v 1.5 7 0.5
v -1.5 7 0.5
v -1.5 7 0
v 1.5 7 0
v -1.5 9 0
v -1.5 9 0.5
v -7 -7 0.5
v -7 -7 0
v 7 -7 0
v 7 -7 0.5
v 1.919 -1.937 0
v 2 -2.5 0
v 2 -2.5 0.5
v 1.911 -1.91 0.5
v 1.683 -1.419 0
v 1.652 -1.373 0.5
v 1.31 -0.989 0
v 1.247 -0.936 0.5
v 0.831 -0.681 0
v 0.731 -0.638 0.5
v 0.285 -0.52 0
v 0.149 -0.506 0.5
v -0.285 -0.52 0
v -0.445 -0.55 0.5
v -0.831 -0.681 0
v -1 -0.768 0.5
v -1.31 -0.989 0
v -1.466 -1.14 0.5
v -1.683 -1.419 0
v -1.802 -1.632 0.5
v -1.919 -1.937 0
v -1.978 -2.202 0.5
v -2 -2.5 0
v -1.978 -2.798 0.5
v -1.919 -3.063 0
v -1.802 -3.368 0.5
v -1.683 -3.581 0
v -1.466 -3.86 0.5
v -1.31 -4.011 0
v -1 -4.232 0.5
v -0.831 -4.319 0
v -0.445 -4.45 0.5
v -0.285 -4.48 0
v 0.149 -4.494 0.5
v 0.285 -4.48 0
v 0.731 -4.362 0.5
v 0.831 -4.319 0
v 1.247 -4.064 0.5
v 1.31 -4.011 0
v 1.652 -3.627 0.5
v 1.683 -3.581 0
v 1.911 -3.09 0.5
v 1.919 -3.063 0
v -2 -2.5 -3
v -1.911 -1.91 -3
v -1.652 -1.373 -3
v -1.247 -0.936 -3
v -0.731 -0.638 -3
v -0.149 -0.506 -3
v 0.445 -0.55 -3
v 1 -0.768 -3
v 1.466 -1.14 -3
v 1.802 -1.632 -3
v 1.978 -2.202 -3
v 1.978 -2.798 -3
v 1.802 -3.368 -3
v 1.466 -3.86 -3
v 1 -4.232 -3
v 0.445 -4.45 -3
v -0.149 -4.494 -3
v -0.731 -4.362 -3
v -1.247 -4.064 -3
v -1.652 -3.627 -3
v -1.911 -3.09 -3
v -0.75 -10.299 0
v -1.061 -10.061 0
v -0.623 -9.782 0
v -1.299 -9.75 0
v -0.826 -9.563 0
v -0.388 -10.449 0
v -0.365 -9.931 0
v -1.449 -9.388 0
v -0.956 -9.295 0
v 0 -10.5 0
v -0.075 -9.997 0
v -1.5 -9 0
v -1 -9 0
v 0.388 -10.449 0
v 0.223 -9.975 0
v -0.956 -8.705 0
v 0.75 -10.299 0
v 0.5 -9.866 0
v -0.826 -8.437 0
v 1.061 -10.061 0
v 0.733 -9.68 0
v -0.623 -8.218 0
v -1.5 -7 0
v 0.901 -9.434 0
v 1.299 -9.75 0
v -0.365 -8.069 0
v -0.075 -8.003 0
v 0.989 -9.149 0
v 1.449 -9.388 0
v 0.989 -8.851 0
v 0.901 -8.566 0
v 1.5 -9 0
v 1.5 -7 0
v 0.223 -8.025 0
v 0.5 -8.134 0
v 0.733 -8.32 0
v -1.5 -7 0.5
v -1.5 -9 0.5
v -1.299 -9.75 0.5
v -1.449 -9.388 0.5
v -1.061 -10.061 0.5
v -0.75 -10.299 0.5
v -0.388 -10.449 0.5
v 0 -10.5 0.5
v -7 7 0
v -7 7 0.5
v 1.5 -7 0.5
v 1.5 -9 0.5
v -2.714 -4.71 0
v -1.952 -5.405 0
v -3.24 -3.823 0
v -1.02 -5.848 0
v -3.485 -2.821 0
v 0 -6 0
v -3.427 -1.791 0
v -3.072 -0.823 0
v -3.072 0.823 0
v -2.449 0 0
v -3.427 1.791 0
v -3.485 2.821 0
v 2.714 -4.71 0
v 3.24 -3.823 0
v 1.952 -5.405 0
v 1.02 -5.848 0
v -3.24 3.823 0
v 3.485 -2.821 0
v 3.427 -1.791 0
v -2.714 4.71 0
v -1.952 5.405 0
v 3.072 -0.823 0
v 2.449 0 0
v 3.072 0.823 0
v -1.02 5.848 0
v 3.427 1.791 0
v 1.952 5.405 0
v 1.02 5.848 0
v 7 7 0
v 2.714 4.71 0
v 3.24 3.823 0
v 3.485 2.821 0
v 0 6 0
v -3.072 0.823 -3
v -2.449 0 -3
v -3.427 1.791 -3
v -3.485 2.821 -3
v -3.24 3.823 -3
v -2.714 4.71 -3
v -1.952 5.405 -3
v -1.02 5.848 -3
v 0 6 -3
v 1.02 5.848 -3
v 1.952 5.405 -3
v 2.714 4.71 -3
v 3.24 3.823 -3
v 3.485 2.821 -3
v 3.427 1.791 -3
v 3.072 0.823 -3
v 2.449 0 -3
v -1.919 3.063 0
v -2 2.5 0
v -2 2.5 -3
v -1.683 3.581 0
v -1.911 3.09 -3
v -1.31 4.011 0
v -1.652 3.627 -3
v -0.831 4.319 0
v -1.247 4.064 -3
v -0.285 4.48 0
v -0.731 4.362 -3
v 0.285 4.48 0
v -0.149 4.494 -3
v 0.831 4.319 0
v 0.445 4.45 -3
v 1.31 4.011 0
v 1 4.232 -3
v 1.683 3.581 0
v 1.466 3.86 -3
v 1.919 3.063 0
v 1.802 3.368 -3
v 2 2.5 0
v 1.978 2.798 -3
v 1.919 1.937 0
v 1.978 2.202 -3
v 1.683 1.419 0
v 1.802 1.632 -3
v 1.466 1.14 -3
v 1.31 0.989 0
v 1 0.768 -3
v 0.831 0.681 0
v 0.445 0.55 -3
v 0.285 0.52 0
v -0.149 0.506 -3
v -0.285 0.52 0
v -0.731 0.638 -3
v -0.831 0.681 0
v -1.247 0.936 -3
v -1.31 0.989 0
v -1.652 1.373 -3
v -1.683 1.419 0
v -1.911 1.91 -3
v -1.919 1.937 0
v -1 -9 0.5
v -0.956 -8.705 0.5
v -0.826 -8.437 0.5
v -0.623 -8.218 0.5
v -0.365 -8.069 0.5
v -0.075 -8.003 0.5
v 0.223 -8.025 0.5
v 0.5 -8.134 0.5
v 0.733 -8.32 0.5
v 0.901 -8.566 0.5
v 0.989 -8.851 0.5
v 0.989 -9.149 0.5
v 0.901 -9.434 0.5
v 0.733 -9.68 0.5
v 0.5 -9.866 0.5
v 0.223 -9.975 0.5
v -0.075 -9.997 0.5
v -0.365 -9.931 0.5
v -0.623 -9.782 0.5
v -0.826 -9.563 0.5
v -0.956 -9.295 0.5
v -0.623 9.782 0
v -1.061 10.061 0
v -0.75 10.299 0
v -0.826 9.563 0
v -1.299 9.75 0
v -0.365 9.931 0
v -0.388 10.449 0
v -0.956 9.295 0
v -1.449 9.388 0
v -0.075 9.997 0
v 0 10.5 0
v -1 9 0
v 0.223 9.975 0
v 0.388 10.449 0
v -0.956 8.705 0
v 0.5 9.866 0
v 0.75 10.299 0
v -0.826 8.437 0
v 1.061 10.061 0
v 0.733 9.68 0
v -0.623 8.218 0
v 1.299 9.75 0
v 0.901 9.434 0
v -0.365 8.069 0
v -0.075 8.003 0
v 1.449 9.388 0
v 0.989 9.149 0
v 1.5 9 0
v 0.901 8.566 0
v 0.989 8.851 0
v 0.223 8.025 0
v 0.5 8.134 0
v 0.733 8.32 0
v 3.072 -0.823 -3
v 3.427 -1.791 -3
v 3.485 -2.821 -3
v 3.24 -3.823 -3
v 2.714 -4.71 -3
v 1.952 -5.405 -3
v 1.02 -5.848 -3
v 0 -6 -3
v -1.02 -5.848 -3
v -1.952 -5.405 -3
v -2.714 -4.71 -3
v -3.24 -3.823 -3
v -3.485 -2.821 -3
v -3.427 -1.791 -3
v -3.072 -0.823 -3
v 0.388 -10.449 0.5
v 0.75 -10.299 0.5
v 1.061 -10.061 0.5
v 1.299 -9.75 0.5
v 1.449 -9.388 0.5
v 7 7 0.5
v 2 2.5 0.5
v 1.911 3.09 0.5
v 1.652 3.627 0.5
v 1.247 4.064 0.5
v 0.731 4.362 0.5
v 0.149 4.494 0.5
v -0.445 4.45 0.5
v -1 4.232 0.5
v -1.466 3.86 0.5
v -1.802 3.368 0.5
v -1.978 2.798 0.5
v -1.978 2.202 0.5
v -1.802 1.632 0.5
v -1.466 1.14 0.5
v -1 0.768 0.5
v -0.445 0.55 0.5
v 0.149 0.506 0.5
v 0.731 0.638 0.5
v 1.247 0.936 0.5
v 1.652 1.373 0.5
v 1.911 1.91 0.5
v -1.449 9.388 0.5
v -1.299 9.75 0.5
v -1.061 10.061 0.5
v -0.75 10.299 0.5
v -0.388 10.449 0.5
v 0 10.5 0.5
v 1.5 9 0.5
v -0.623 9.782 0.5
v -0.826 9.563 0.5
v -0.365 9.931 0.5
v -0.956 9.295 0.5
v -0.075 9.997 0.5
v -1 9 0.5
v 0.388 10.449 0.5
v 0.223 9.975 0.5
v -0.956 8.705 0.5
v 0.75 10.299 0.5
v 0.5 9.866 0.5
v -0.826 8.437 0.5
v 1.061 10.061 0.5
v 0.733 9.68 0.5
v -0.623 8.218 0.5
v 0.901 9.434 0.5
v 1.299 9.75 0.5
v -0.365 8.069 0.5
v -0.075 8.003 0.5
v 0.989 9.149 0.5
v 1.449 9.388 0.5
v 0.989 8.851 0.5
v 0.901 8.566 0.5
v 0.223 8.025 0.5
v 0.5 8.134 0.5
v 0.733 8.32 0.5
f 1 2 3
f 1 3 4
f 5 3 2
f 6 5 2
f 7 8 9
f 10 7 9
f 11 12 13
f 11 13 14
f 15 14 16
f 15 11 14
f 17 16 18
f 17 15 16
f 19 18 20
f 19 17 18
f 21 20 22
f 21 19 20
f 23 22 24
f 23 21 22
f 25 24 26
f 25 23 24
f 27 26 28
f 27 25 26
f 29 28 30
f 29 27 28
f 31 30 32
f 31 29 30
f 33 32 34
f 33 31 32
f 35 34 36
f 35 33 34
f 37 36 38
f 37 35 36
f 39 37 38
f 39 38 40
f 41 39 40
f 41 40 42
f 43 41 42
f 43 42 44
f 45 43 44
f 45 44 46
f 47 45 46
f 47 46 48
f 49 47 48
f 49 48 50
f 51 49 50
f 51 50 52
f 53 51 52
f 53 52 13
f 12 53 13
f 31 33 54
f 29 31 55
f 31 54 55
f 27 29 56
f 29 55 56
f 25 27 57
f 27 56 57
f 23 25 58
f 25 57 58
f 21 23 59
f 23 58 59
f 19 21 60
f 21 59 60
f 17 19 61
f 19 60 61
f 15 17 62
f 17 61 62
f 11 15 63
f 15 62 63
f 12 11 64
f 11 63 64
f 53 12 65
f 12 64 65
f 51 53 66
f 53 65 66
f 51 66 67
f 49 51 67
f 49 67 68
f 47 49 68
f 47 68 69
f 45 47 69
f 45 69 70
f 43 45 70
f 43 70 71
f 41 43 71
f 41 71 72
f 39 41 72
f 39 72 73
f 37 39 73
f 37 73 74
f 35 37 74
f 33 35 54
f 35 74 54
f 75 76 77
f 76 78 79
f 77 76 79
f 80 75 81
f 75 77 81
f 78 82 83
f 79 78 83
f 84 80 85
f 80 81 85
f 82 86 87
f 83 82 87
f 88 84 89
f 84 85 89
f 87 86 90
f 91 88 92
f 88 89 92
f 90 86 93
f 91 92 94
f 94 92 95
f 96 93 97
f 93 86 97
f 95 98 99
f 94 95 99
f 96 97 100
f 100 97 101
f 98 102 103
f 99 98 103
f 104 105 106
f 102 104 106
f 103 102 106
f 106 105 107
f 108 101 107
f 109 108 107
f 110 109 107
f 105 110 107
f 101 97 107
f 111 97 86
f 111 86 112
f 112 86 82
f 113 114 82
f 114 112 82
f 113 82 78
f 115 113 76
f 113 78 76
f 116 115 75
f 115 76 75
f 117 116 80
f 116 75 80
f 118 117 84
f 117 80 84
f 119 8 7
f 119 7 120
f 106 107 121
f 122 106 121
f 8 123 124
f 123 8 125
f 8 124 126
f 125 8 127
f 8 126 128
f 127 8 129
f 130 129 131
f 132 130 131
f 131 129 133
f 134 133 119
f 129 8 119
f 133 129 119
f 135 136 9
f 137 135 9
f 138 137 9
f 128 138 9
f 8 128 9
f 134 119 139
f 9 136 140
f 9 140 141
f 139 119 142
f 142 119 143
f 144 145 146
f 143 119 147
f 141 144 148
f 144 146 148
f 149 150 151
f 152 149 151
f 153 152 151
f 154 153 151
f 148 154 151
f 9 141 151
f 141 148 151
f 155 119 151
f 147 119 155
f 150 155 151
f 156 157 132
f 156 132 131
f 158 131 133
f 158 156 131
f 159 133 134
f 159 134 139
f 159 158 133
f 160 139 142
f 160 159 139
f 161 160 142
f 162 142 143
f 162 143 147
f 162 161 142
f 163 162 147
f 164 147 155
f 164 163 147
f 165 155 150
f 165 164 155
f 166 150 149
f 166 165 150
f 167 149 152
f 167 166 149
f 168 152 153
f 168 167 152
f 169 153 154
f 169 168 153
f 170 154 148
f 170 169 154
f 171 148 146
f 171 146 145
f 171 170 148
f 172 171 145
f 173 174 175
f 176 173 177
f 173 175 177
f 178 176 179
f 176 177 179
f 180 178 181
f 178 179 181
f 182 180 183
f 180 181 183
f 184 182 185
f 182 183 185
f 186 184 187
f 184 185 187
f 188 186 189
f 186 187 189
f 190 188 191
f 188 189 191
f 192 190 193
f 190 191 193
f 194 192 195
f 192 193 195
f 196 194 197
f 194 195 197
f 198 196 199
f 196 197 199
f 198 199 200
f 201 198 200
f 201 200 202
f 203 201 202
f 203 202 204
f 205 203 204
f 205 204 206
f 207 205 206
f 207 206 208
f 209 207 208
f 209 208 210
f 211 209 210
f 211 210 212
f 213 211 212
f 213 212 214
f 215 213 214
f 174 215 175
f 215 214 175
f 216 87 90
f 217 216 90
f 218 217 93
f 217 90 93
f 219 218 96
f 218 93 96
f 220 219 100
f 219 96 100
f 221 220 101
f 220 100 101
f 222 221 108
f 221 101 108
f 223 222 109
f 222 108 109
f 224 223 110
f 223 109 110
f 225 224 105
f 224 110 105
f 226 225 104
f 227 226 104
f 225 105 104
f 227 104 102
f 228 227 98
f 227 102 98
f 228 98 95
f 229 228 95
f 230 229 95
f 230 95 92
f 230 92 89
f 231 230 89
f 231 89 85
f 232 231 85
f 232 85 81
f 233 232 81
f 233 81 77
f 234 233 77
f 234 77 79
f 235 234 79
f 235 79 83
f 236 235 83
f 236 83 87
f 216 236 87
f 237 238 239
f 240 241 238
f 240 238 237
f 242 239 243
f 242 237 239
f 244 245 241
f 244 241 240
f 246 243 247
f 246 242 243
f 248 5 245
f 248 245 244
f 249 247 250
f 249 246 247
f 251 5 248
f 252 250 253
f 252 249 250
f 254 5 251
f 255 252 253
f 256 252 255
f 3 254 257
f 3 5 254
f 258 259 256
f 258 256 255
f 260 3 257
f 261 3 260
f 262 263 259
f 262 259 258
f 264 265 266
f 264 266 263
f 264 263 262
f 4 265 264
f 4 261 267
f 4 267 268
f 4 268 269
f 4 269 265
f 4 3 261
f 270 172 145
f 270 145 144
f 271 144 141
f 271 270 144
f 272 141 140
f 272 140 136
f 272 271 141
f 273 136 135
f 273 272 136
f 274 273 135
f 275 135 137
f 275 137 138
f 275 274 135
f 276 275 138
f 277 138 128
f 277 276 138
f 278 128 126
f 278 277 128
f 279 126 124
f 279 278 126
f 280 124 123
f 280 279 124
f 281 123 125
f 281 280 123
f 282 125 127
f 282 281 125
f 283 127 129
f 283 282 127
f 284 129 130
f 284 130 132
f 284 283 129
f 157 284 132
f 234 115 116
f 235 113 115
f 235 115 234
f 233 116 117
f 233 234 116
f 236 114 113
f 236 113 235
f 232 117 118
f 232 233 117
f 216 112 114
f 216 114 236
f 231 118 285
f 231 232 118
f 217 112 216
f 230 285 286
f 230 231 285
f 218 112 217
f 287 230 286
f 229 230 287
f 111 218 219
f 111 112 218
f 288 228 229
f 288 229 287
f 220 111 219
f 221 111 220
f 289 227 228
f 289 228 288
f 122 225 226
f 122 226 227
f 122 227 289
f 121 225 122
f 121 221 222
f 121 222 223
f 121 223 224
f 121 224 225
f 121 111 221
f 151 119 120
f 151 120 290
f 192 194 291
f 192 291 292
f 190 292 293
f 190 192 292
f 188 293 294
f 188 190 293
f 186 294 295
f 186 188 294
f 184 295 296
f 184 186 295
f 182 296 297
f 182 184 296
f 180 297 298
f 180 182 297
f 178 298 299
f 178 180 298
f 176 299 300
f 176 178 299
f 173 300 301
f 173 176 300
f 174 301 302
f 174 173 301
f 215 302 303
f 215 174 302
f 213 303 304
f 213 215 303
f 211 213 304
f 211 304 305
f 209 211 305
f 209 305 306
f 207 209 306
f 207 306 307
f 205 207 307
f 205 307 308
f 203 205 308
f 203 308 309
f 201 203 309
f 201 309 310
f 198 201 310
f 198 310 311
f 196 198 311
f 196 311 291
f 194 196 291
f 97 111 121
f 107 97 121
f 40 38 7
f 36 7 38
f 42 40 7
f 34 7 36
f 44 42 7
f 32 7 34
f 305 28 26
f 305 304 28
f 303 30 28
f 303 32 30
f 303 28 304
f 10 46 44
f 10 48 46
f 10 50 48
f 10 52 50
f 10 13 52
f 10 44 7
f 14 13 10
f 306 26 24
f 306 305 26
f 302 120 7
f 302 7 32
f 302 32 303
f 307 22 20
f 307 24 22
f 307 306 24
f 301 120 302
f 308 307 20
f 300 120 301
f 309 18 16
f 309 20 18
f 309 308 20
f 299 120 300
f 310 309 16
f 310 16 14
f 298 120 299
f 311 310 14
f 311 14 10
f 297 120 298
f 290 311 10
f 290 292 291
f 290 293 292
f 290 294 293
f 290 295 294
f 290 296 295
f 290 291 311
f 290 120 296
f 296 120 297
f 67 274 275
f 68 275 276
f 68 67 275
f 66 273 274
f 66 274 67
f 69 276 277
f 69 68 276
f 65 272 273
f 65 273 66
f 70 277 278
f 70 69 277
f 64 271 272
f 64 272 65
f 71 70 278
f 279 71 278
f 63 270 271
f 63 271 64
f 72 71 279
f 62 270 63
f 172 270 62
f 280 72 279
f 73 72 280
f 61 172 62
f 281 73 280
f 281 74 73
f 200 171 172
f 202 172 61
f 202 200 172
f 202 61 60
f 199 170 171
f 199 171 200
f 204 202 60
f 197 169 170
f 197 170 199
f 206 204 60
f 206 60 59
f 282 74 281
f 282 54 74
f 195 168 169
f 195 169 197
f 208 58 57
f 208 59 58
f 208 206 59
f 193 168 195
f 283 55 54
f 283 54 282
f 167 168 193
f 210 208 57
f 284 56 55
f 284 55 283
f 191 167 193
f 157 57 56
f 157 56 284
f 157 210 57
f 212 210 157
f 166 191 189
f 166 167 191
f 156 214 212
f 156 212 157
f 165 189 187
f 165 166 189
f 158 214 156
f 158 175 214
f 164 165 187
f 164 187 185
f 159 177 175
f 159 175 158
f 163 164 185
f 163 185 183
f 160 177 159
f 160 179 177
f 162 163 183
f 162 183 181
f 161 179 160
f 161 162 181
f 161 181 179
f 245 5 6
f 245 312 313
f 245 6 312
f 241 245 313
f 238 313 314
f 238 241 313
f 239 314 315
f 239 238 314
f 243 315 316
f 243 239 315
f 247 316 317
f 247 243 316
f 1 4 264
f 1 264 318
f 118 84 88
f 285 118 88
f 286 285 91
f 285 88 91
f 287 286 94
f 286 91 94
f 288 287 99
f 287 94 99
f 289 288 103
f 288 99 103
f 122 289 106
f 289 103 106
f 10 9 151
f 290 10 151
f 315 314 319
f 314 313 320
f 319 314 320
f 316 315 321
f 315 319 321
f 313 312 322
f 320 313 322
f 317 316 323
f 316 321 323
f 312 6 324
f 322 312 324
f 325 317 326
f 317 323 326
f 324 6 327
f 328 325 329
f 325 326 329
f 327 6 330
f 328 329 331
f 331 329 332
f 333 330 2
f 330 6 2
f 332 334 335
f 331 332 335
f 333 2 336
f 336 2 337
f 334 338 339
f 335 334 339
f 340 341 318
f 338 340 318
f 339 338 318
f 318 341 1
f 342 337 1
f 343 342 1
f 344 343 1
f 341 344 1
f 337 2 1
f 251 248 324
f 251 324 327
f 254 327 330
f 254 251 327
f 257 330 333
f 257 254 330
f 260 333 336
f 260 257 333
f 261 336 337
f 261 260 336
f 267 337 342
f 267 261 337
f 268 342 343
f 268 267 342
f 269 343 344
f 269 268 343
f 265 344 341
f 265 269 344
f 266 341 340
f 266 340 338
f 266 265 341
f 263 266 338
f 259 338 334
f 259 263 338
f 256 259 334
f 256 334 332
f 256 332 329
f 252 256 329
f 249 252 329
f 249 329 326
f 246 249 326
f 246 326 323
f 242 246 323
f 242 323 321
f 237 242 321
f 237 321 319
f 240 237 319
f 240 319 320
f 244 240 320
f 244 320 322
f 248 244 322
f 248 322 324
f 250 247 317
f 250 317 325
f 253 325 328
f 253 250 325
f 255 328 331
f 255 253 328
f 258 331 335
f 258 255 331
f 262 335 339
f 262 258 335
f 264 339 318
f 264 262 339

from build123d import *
from build123d.topology import SkipClean

# Parameters (mm, degrees)
SKETCH_2_W          = 14
SKETCH_2_H          = 14
SKETCH_2_R          = 2
EXTRUDE_1_DEPTH     = 0.5
SKETCH_3_W          = 3
SKETCH_3_H          = 0.5
EXTRUDE_2_DEPTH     = 3.5
CUT_EXTRUDE_1_DEPTH = 4
SKETCH_5_R          = 1
CUT_EXTRUDE_2_DEPTH = 4
EXTRUDE_START       = 3
SKETCH_8_R          = 2
EXTRUDE_4_DEPTH     = 3


with BuildPart() as part:
    # 草图2 → 凸台-拉伸1 (new body)
    with BuildSketch(Plane.XY):
        Rectangle(SKETCH_2_W, SKETCH_2_H)
        with Locations((0, -2.5)):
            Circle(SKETCH_2_R, mode=Mode.SUBTRACT)
        with Locations((0, 2.5)):
            Circle(SKETCH_2_R, mode=Mode.SUBTRACT)
    extrude(amount=EXTRUDE_1_DEPTH)

    # 草图8 → 凸台-拉伸4 (add)
    with SkipClean():  # the faces are left unmerged after this step: merging them gives an invalid solid
        with BuildSketch(Plane(origin=(0, 0, 0), x_dir=(-1, 0, 0), z_dir=(0, 0, -1)).offset(EXTRUDE_START)):
            with BuildLine():
                ThreePointArc((2.449489743, 0), (0, 6), (-2.449489743, 0))
                ThreePointArc((-2.449489743, 0), (0, -6), (2.449489743, 0))
            make_face()
            with Locations((0, -2.5)):
                Circle(SKETCH_8_R, mode=Mode.SUBTRACT)
            with Locations((0, 2.5)):
                Circle(SKETCH_8_R, mode=Mode.SUBTRACT)
        extrude(amount=-EXTRUDE_4_DEPTH)


with BuildPart() as body_2:
    # 草图3 → 凸台-拉伸2 (new body)
    with BuildSketch(Plane.XZ.offset(7)):
        with Locations((0, 0.25)):
            Rectangle(SKETCH_3_W, SKETCH_3_H)
    extrude(amount=EXTRUDE_2_DEPTH)

    # 草图4 → 切除-拉伸1 (cut)
    with BuildSketch(Plane(origin=(0, 0, 0), x_dir=(-1, 0, 0), z_dir=(0, 0, -1))):
        with BuildLine():
            Line((1.5, -10.5), (1.5, -9))
            ThreePointArc((1.5, -9), (1.060660172, -10.060660172), (0, -10.5))
            Line((0, -10.5), (1.5, -10.5))
        make_face()
        with BuildLine():
            ThreePointArc((0, -10.5), (-1.060660172, -10.060660172), (-1.5, -9))
            Line((-1.5, -9), (-1.5, -10.5))
            Line((-1.5, -10.5), (0, -10.5))
        make_face()
    extrude(amount=-CUT_EXTRUDE_1_DEPTH, mode=Mode.SUBTRACT)

    # 草图5 → 切除-拉伸2 (cut)
    with BuildSketch(Plane(origin=(0, 0, 0), x_dir=(-1, 0, 0), z_dir=(0, 0, -1))):
        with Locations((0, -9)):
            Circle(SKETCH_5_R)
    extrude(amount=-CUT_EXTRUDE_2_DEPTH, mode=Mode.SUBTRACT)


with BuildPart() as body_3:
    # 镜向7: mirrored copy
    add(body_2.part.mirror(Plane.ZX))


solid = Compound([part.part, body_2.part, body_3.part])
